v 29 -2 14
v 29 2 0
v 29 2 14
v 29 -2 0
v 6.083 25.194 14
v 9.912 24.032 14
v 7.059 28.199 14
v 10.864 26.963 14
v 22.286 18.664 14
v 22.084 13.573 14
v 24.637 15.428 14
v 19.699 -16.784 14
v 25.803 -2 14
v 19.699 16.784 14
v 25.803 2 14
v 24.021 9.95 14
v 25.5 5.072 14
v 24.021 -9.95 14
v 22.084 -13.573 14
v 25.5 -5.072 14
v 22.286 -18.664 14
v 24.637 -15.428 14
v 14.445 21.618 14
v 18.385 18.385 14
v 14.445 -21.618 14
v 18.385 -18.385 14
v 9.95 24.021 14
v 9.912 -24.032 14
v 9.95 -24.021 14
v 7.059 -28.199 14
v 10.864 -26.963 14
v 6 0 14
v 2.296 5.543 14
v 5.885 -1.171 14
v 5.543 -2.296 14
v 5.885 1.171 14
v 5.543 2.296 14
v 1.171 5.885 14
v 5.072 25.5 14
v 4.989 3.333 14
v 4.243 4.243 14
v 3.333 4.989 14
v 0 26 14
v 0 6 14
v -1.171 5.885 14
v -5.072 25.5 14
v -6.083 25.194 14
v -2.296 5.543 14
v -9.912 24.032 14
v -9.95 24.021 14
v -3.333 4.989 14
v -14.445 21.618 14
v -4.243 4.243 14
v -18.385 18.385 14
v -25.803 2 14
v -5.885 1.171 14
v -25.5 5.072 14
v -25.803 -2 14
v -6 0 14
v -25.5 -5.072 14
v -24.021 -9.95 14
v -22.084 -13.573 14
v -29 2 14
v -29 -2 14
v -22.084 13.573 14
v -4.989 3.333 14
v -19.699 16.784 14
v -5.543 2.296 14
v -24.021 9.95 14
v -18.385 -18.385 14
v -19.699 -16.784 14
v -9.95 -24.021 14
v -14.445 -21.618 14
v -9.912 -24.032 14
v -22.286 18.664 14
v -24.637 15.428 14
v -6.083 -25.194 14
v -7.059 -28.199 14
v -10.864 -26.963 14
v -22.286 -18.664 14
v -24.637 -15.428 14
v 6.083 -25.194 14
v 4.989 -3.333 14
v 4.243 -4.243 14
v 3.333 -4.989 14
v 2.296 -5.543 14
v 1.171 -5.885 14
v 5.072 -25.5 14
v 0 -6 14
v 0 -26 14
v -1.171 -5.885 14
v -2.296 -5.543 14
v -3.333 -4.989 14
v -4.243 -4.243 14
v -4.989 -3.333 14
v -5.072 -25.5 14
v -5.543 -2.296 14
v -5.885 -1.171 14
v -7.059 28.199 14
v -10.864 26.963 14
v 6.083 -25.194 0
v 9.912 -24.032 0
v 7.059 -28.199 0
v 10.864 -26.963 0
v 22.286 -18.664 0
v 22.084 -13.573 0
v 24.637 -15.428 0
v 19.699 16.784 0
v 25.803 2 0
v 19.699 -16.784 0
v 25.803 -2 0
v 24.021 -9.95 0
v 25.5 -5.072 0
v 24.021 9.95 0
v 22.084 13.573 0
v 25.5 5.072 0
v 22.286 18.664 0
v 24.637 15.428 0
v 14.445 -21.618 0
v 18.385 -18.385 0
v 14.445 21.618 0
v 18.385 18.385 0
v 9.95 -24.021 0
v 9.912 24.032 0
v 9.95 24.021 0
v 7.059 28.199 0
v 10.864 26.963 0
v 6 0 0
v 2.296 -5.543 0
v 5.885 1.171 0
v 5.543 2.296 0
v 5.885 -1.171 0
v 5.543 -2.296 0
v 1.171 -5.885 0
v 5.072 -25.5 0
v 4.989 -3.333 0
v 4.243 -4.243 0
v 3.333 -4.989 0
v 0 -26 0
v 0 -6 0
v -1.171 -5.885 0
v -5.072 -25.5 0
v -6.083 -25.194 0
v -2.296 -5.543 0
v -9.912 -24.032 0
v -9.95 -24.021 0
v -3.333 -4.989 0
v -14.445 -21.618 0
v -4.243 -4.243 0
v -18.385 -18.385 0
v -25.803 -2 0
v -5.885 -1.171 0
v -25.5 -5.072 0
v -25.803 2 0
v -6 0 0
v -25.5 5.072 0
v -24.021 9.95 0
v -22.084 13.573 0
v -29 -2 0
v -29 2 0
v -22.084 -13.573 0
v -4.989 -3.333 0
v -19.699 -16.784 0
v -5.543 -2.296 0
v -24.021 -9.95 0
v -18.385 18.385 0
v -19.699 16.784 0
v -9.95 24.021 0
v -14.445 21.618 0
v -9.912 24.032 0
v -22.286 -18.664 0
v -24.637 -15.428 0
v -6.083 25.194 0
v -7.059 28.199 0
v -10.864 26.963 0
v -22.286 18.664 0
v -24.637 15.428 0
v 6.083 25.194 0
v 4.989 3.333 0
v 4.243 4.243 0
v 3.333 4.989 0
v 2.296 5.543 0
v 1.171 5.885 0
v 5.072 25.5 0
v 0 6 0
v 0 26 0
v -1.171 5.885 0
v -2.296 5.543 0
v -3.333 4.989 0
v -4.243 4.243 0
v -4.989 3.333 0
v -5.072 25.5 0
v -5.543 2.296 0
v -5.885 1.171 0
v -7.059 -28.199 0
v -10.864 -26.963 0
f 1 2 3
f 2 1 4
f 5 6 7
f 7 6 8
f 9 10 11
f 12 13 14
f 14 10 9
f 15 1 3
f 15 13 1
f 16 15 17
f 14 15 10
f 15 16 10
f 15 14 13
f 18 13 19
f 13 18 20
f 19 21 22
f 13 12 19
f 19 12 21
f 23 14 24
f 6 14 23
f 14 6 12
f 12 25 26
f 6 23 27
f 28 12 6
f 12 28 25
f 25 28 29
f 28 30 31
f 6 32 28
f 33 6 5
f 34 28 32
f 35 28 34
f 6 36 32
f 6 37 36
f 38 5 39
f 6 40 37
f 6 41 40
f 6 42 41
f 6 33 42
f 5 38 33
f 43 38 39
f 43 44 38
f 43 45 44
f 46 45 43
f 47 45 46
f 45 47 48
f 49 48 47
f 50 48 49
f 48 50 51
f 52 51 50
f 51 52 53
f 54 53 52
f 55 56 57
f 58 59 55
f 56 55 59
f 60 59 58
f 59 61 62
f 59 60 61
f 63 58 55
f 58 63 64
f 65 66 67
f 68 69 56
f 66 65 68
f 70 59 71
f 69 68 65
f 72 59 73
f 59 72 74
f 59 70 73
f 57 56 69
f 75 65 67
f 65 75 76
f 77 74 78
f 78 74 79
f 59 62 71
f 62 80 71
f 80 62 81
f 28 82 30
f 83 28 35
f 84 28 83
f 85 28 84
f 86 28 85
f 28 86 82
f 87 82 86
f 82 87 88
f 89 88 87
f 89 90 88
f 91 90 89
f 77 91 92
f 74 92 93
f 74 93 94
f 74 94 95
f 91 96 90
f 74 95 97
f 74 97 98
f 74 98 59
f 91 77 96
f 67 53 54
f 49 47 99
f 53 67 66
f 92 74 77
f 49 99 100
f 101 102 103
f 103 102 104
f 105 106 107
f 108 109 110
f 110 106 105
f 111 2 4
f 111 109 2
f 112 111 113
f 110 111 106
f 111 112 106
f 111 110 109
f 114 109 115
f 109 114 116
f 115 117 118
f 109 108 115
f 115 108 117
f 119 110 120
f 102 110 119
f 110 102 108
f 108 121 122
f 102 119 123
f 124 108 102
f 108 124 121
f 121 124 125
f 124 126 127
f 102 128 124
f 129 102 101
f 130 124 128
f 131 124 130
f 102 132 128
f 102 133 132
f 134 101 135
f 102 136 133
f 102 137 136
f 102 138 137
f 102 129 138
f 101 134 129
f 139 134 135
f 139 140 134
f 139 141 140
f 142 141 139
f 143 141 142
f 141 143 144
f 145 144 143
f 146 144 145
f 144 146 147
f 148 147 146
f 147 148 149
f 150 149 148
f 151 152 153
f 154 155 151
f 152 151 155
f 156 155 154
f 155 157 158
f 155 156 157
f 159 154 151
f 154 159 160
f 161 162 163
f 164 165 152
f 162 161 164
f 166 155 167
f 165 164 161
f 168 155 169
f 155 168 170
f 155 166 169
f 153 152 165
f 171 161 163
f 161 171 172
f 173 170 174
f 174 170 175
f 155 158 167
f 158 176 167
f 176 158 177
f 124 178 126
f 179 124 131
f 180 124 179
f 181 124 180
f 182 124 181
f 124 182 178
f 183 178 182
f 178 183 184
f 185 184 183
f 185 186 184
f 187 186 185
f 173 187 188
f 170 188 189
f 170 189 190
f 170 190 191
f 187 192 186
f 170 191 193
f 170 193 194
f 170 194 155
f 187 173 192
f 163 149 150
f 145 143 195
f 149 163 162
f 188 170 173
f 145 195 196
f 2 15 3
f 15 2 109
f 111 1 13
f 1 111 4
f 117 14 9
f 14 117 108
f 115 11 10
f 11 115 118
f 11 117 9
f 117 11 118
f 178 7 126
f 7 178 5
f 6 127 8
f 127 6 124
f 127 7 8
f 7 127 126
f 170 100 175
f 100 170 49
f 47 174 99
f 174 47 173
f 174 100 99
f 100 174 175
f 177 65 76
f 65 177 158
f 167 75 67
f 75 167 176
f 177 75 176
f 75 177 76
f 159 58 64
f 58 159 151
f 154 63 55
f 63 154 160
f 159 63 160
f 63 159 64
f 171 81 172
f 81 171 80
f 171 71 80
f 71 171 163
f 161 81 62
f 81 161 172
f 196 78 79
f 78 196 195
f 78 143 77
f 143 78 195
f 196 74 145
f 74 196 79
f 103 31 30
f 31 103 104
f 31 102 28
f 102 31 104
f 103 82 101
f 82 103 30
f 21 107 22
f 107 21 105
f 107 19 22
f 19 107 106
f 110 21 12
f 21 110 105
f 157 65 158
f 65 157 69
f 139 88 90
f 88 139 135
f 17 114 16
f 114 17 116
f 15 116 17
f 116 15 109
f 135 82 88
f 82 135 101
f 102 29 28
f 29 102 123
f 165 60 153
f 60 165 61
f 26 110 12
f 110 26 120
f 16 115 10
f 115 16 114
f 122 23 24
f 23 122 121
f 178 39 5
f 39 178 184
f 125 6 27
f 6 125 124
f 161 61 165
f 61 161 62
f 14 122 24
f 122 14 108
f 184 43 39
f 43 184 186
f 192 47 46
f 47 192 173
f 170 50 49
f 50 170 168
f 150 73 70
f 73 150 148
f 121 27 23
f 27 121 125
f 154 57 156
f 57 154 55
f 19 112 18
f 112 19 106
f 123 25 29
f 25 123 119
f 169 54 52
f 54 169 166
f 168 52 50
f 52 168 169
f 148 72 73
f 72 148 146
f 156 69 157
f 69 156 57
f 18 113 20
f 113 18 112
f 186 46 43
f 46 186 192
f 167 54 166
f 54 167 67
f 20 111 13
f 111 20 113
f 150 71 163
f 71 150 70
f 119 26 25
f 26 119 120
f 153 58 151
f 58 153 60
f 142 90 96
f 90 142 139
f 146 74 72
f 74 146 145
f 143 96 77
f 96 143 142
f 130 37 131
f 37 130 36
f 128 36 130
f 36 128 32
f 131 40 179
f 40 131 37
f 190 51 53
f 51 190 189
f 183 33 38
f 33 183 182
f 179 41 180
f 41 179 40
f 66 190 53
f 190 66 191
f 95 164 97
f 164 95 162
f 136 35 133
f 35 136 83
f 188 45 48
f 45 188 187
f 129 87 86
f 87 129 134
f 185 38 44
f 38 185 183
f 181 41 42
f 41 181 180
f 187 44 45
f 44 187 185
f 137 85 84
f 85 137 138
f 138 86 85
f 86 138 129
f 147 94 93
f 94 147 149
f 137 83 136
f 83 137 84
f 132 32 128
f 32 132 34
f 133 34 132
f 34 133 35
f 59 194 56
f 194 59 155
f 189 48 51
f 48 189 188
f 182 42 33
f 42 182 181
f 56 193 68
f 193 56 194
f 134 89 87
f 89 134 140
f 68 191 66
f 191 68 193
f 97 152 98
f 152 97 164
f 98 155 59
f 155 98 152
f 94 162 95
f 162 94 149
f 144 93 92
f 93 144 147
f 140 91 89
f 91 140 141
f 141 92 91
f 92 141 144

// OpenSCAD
$fn = 32;

// ----------------------------------------------------------------------
// Spur blank: bored gear blank
// ----------------------------------------------------------------------

// --- parameters (mm) ---
disc_r = 26;              // blank root radius
disc_t = 14;              // blank thickness
n_teeth = 10;             // stub tooth count
tooth_w = 4;              // tooth width at the root
tooth_h = 3;              // tooth height above the root
bore_r = 6;               // central bore radius
fit_tol = 0.02;           // tolerance for press fits, mm
free_tol = 0.2;           // tolerance for clearance fits, mm

out_r = disc_r + tooth_h;  // tip radius
bbox_x = 58.0;  // measured width over the teeth
bbox_y = 56.4;  // measured depth over the teeth

difference() {
union() {
  cylinder(r = disc_r, h = disc_t);
  for (i = [0 : n_teeth - 1])
    rotate([0, 0, i * 360 / n_teeth])
      translate([disc_r - 1, -tooth_w / 2, 0])
        cube([tooth_h + 1, tooth_w, disc_t]);
}
  translate([0, 0, -1]) cylinder(r = bore_r, h = disc_t + 2);
}
